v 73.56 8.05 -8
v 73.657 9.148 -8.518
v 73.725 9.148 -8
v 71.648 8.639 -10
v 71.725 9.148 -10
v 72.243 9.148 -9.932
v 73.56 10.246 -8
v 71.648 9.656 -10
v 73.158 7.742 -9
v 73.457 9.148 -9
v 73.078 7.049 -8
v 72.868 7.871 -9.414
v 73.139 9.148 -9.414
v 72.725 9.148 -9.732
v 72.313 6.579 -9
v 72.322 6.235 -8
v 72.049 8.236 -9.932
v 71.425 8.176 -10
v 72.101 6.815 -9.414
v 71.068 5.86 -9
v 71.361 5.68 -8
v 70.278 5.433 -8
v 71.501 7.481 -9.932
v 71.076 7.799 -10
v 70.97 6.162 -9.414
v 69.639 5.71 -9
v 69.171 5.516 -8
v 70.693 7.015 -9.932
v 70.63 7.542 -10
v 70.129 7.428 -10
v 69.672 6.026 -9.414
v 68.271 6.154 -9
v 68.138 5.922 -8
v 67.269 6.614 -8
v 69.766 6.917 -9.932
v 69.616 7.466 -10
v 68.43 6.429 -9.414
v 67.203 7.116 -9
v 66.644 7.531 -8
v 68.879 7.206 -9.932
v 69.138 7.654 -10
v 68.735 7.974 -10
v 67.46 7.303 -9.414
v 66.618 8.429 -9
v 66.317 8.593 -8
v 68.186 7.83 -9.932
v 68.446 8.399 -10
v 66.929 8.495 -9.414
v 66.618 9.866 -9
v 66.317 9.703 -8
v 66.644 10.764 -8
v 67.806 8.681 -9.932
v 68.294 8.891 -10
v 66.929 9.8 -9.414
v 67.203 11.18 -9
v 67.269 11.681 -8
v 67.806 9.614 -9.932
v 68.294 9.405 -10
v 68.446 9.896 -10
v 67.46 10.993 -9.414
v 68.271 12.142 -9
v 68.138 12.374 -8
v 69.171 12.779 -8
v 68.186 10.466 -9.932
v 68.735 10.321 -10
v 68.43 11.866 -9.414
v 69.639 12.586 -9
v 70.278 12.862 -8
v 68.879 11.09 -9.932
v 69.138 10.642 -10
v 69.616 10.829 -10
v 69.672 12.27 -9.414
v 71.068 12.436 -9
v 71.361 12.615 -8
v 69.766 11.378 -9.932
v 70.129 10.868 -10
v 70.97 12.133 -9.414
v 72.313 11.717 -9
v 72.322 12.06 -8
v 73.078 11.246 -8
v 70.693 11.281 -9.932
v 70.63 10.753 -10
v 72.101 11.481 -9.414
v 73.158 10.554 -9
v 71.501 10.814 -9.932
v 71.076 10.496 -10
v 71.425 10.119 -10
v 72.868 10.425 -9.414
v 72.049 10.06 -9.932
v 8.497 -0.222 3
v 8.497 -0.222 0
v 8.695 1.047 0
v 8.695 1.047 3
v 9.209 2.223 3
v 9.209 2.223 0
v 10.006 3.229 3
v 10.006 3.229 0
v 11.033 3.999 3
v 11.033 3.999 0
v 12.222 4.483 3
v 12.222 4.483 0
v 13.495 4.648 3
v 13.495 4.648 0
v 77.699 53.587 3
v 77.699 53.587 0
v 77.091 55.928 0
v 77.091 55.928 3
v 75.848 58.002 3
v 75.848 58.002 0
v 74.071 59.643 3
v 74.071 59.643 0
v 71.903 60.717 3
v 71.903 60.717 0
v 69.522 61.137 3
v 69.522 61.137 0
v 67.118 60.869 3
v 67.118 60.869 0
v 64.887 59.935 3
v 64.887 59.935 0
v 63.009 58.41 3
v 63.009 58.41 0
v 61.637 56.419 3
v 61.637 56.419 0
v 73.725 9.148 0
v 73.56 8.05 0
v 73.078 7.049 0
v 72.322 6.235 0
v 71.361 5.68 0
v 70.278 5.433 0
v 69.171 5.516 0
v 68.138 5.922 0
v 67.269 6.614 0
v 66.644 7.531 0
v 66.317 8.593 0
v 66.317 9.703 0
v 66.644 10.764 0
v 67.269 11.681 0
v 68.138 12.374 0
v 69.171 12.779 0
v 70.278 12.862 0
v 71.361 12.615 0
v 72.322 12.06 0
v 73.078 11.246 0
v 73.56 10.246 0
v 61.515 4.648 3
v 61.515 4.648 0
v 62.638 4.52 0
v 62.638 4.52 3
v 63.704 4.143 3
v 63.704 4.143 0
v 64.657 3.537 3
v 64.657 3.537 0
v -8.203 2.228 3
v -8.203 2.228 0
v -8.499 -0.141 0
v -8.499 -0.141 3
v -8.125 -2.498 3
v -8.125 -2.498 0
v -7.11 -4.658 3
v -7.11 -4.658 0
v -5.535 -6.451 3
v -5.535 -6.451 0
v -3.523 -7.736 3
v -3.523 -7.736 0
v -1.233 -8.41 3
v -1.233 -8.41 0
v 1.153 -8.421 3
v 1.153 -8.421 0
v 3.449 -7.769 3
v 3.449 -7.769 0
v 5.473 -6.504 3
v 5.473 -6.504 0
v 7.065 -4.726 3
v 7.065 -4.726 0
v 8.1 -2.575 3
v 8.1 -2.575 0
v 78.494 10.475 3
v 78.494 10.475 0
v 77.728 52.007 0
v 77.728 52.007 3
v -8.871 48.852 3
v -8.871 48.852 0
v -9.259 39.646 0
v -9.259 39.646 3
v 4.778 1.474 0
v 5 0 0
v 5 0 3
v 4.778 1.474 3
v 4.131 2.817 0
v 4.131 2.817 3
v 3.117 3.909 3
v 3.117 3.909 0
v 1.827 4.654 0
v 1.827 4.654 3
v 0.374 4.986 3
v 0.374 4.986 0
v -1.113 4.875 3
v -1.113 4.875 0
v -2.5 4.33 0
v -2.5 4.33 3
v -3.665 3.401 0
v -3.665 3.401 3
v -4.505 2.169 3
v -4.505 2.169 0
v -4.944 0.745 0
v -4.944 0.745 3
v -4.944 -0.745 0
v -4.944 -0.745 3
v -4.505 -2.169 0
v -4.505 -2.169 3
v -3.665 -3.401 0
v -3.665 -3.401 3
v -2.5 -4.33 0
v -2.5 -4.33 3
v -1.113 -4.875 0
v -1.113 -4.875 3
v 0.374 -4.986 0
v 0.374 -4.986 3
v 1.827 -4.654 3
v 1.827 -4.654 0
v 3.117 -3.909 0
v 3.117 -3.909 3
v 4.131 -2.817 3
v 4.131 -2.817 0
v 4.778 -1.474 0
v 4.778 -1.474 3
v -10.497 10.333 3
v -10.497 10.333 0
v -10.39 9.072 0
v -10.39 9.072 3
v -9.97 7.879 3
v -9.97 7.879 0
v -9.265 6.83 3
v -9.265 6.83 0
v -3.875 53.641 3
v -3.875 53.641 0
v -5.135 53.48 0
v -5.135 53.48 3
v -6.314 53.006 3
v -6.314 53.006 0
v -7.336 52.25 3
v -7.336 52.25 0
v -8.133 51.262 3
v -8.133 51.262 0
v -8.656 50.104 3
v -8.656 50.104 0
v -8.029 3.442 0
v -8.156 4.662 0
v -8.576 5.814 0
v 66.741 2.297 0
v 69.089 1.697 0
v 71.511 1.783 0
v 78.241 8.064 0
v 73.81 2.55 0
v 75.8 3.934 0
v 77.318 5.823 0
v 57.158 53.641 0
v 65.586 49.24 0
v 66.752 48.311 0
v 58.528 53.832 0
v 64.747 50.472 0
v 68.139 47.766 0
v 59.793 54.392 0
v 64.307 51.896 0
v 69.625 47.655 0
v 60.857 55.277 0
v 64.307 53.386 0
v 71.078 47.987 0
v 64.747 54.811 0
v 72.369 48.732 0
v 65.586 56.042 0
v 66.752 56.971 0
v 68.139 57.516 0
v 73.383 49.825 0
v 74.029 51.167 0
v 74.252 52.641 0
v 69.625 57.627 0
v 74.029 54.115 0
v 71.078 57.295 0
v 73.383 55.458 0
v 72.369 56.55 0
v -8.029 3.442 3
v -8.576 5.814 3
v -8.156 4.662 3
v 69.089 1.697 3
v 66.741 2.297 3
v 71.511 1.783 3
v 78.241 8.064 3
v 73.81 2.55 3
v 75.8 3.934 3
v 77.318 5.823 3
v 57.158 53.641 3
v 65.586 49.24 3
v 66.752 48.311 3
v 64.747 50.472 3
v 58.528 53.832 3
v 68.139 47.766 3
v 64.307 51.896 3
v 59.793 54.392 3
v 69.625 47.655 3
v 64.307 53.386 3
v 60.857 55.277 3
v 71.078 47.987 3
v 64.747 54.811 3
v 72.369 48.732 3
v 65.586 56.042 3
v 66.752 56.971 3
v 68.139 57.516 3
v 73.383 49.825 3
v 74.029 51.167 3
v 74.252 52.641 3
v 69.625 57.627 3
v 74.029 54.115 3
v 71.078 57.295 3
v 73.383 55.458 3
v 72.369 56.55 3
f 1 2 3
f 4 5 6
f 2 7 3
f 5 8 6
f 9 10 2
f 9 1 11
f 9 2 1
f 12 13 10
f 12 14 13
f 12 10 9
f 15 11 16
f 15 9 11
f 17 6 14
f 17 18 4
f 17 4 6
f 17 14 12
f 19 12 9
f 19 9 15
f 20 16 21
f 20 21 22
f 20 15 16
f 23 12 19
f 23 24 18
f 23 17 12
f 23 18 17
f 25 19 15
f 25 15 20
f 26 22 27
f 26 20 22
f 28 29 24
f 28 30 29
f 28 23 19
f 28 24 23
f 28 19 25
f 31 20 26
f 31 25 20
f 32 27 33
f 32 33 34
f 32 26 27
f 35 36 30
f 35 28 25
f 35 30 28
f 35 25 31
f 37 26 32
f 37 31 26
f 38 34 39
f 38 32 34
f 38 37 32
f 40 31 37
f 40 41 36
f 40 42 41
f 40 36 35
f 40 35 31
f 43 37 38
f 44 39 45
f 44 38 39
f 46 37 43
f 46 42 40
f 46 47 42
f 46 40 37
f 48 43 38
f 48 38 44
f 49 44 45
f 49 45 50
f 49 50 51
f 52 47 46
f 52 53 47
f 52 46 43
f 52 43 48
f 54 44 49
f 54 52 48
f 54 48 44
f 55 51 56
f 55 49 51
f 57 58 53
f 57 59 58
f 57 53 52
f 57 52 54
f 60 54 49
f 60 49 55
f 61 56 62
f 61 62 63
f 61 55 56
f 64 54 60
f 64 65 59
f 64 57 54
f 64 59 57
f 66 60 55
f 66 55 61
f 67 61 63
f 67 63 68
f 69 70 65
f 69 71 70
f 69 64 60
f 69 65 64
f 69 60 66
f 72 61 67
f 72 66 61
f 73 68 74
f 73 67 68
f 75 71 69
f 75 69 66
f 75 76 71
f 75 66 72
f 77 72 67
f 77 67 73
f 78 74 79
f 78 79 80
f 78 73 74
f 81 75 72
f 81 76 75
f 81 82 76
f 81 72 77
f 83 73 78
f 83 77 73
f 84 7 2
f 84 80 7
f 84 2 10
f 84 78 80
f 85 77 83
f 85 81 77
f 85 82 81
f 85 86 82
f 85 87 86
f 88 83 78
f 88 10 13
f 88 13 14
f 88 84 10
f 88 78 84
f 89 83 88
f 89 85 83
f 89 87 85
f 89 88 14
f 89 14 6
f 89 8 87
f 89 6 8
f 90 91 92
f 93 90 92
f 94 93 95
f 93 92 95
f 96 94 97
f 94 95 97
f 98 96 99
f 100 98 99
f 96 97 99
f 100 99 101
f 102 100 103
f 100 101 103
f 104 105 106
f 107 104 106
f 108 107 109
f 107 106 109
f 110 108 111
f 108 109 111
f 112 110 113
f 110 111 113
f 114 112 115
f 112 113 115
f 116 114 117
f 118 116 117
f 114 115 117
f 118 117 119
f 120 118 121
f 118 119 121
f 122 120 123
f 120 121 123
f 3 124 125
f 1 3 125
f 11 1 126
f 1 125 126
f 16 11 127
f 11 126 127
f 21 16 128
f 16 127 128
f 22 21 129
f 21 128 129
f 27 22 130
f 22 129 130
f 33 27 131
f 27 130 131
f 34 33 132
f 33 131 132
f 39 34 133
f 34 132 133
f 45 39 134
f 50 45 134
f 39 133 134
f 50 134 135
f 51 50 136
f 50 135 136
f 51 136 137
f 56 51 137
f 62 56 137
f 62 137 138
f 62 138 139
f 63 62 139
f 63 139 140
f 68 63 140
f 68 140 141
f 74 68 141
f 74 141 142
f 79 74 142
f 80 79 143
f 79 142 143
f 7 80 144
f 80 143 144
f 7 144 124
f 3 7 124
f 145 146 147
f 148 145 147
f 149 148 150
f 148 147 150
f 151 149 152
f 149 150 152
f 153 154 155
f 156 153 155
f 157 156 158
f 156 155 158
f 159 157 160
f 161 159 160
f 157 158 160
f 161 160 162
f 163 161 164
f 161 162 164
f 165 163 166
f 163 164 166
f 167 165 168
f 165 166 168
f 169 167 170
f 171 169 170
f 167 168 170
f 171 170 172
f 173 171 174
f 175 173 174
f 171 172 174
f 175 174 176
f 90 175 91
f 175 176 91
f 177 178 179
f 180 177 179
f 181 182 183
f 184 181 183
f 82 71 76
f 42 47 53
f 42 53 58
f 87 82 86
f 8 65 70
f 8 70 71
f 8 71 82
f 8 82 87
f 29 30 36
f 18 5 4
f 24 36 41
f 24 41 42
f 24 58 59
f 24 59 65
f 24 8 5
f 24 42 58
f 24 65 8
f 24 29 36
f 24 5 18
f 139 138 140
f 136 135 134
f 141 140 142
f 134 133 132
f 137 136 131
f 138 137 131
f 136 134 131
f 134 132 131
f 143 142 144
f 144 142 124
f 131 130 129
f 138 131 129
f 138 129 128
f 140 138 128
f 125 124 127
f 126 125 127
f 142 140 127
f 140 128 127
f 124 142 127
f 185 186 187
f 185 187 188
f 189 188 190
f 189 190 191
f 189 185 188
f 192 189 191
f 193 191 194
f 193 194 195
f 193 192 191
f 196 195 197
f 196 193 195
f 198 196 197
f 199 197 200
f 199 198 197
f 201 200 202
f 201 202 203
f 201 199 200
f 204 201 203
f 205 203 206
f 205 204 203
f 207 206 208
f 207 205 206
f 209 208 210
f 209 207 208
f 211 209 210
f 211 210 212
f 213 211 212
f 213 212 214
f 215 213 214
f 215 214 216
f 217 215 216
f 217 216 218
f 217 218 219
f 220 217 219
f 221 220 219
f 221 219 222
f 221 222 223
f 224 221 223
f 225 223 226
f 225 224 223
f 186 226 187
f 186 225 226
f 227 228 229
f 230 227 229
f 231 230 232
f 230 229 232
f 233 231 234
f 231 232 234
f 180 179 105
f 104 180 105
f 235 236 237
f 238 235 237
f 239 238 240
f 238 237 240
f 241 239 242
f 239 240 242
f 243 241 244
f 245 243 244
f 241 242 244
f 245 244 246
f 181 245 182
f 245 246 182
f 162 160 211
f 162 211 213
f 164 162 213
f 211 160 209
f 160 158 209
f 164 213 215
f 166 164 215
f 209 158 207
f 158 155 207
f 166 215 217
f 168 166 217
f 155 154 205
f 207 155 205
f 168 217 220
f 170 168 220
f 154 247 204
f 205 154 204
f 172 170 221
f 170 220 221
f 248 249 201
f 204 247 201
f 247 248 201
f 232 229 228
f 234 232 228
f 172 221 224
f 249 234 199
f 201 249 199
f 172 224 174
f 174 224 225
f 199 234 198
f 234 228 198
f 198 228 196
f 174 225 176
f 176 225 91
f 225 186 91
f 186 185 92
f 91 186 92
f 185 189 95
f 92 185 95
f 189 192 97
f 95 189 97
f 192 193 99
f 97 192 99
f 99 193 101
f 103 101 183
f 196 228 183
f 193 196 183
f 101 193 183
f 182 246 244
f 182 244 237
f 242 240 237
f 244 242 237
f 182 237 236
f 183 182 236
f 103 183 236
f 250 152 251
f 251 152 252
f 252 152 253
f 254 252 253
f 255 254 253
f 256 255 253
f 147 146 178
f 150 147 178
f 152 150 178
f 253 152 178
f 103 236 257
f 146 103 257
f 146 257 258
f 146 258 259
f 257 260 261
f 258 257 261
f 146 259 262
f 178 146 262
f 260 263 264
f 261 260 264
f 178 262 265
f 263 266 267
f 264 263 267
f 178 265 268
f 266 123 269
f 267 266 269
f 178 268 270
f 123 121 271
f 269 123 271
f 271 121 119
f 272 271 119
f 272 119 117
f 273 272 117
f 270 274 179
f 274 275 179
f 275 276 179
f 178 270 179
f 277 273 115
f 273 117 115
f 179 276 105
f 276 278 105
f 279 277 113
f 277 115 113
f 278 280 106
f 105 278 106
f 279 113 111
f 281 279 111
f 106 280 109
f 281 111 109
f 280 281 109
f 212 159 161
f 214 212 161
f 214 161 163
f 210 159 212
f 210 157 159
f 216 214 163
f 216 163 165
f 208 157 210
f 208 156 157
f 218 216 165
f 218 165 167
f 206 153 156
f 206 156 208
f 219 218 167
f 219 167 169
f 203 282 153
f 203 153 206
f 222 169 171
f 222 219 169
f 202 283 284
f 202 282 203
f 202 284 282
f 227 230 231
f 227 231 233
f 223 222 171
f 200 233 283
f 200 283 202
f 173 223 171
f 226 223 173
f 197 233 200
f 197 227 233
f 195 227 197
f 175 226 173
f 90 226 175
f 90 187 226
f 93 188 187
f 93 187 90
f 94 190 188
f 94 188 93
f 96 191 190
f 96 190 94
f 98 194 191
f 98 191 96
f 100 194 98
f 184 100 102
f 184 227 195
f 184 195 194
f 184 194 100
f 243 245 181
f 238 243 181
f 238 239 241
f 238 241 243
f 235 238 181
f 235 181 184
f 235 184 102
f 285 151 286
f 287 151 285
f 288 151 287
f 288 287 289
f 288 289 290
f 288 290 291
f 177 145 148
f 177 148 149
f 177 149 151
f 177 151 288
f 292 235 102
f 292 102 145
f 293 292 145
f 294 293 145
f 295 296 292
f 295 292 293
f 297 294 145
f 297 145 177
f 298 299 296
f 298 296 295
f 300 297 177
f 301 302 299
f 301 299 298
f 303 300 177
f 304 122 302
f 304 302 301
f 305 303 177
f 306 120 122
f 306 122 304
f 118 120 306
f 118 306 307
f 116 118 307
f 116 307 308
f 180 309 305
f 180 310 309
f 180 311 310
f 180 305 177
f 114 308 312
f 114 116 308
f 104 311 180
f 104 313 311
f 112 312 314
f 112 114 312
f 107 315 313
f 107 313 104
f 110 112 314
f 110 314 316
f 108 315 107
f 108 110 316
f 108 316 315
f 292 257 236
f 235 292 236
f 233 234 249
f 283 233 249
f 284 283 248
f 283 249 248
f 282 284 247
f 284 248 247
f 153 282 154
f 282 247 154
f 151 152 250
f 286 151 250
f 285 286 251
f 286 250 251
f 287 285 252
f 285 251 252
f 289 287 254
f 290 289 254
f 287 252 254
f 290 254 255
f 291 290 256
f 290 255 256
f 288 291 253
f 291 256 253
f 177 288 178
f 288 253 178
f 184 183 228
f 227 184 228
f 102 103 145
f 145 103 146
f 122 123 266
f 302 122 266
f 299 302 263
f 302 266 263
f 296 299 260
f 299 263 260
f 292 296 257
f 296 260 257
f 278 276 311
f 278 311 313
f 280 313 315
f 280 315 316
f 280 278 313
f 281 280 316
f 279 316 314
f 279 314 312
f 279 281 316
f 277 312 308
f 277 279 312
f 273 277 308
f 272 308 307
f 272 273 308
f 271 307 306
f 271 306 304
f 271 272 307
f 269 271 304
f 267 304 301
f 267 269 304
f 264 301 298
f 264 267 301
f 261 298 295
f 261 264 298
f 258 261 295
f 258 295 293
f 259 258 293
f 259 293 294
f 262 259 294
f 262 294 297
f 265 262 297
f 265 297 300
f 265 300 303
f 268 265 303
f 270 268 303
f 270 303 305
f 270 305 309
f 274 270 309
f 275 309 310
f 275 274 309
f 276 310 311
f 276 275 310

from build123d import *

# Parameters (mm, degrees)
F0_R     = 5
F1_DEPTH = 3
F2_R     = 3.725
F3_DEPTH = 10
F4_R     = 2


with BuildPart() as f1:
    # F0 (on Top) → F1 (new body)
    with BuildSketch(Plane.XY):
        with BuildLine():
            Line((78.493695, 10.47503), (77.727954, 52.007354))
            Line((77.727954, 52.007354), (77.698832, 53.58689))
            ThreePointArc((77.698832, 53.58689), (70.727577, 61.011984), (61.637258, 56.418888))
            ThreePointArc((61.637258, 56.418888), (59.793458, 54.391927), (57.158226, 53.64111))
            Line((57.158226, 53.64111), (-3.875332, 53.64111))
            ThreePointArc((-3.875332, 53.64111), (-7.335509, 52.250428), (-8.870883, 48.85198))
            Line((-8.870883, 48.85198), (-9.25947, 39.646301))
            Line((-9.25947, 39.646301), (-10.496852, 10.332507))
            ThreePointArc((-10.496852, 10.332507), (-10.218006, 8.462513), (-9.264741, 6.82975))
            ThreePointArc((-9.264741, 6.82975), (-8.156171, 4.661924), (-8.202929, 2.227544))
            ThreePointArc((-8.202929, 2.227544), (-1.233482, -8.410025), (8.497105, -0.221819))
            ThreePointArc((8.497105, -0.221819), (10.006306, 3.229069), (13.495402, 4.6477))
            Line((13.495402, 4.6477), (61.514719, 4.6477))
            ThreePointArc((61.514719, 4.6477), (63.181385, 4.361745), (64.657415, 3.536589))
            ThreePointArc((64.657415, 3.536589), (73.810232, 2.549533), (78.493695, 10.47503))
        make_face()
        Circle(F0_R, mode=Mode.SUBTRACT)
        with Locations((69.251613, 52.64111)):
            Circle(F0_R, mode=Mode.SUBTRACT)
    extrude(amount=F1_DEPTH)


with BuildPart() as f3:
    # F2 (on face) → F3 (new body)
    with BuildSketch(Plane(origin=(0, 0, 0), x_dir=(1, 0, 0), z_dir=(0, 0, -1))):
        with Locations((70, -9.1477)):
            Circle(F2_R)
    extrude(amount=F3_DEPTH)

    # F4
    f4_edges = [f3.edges().sort_by_distance(p)[0] for p in [
        (66.275, 9.1477, -10),
    ]]
    fillet(f4_edges, radius=F4_R)


solid = Compound([f1.part, f3.part])
